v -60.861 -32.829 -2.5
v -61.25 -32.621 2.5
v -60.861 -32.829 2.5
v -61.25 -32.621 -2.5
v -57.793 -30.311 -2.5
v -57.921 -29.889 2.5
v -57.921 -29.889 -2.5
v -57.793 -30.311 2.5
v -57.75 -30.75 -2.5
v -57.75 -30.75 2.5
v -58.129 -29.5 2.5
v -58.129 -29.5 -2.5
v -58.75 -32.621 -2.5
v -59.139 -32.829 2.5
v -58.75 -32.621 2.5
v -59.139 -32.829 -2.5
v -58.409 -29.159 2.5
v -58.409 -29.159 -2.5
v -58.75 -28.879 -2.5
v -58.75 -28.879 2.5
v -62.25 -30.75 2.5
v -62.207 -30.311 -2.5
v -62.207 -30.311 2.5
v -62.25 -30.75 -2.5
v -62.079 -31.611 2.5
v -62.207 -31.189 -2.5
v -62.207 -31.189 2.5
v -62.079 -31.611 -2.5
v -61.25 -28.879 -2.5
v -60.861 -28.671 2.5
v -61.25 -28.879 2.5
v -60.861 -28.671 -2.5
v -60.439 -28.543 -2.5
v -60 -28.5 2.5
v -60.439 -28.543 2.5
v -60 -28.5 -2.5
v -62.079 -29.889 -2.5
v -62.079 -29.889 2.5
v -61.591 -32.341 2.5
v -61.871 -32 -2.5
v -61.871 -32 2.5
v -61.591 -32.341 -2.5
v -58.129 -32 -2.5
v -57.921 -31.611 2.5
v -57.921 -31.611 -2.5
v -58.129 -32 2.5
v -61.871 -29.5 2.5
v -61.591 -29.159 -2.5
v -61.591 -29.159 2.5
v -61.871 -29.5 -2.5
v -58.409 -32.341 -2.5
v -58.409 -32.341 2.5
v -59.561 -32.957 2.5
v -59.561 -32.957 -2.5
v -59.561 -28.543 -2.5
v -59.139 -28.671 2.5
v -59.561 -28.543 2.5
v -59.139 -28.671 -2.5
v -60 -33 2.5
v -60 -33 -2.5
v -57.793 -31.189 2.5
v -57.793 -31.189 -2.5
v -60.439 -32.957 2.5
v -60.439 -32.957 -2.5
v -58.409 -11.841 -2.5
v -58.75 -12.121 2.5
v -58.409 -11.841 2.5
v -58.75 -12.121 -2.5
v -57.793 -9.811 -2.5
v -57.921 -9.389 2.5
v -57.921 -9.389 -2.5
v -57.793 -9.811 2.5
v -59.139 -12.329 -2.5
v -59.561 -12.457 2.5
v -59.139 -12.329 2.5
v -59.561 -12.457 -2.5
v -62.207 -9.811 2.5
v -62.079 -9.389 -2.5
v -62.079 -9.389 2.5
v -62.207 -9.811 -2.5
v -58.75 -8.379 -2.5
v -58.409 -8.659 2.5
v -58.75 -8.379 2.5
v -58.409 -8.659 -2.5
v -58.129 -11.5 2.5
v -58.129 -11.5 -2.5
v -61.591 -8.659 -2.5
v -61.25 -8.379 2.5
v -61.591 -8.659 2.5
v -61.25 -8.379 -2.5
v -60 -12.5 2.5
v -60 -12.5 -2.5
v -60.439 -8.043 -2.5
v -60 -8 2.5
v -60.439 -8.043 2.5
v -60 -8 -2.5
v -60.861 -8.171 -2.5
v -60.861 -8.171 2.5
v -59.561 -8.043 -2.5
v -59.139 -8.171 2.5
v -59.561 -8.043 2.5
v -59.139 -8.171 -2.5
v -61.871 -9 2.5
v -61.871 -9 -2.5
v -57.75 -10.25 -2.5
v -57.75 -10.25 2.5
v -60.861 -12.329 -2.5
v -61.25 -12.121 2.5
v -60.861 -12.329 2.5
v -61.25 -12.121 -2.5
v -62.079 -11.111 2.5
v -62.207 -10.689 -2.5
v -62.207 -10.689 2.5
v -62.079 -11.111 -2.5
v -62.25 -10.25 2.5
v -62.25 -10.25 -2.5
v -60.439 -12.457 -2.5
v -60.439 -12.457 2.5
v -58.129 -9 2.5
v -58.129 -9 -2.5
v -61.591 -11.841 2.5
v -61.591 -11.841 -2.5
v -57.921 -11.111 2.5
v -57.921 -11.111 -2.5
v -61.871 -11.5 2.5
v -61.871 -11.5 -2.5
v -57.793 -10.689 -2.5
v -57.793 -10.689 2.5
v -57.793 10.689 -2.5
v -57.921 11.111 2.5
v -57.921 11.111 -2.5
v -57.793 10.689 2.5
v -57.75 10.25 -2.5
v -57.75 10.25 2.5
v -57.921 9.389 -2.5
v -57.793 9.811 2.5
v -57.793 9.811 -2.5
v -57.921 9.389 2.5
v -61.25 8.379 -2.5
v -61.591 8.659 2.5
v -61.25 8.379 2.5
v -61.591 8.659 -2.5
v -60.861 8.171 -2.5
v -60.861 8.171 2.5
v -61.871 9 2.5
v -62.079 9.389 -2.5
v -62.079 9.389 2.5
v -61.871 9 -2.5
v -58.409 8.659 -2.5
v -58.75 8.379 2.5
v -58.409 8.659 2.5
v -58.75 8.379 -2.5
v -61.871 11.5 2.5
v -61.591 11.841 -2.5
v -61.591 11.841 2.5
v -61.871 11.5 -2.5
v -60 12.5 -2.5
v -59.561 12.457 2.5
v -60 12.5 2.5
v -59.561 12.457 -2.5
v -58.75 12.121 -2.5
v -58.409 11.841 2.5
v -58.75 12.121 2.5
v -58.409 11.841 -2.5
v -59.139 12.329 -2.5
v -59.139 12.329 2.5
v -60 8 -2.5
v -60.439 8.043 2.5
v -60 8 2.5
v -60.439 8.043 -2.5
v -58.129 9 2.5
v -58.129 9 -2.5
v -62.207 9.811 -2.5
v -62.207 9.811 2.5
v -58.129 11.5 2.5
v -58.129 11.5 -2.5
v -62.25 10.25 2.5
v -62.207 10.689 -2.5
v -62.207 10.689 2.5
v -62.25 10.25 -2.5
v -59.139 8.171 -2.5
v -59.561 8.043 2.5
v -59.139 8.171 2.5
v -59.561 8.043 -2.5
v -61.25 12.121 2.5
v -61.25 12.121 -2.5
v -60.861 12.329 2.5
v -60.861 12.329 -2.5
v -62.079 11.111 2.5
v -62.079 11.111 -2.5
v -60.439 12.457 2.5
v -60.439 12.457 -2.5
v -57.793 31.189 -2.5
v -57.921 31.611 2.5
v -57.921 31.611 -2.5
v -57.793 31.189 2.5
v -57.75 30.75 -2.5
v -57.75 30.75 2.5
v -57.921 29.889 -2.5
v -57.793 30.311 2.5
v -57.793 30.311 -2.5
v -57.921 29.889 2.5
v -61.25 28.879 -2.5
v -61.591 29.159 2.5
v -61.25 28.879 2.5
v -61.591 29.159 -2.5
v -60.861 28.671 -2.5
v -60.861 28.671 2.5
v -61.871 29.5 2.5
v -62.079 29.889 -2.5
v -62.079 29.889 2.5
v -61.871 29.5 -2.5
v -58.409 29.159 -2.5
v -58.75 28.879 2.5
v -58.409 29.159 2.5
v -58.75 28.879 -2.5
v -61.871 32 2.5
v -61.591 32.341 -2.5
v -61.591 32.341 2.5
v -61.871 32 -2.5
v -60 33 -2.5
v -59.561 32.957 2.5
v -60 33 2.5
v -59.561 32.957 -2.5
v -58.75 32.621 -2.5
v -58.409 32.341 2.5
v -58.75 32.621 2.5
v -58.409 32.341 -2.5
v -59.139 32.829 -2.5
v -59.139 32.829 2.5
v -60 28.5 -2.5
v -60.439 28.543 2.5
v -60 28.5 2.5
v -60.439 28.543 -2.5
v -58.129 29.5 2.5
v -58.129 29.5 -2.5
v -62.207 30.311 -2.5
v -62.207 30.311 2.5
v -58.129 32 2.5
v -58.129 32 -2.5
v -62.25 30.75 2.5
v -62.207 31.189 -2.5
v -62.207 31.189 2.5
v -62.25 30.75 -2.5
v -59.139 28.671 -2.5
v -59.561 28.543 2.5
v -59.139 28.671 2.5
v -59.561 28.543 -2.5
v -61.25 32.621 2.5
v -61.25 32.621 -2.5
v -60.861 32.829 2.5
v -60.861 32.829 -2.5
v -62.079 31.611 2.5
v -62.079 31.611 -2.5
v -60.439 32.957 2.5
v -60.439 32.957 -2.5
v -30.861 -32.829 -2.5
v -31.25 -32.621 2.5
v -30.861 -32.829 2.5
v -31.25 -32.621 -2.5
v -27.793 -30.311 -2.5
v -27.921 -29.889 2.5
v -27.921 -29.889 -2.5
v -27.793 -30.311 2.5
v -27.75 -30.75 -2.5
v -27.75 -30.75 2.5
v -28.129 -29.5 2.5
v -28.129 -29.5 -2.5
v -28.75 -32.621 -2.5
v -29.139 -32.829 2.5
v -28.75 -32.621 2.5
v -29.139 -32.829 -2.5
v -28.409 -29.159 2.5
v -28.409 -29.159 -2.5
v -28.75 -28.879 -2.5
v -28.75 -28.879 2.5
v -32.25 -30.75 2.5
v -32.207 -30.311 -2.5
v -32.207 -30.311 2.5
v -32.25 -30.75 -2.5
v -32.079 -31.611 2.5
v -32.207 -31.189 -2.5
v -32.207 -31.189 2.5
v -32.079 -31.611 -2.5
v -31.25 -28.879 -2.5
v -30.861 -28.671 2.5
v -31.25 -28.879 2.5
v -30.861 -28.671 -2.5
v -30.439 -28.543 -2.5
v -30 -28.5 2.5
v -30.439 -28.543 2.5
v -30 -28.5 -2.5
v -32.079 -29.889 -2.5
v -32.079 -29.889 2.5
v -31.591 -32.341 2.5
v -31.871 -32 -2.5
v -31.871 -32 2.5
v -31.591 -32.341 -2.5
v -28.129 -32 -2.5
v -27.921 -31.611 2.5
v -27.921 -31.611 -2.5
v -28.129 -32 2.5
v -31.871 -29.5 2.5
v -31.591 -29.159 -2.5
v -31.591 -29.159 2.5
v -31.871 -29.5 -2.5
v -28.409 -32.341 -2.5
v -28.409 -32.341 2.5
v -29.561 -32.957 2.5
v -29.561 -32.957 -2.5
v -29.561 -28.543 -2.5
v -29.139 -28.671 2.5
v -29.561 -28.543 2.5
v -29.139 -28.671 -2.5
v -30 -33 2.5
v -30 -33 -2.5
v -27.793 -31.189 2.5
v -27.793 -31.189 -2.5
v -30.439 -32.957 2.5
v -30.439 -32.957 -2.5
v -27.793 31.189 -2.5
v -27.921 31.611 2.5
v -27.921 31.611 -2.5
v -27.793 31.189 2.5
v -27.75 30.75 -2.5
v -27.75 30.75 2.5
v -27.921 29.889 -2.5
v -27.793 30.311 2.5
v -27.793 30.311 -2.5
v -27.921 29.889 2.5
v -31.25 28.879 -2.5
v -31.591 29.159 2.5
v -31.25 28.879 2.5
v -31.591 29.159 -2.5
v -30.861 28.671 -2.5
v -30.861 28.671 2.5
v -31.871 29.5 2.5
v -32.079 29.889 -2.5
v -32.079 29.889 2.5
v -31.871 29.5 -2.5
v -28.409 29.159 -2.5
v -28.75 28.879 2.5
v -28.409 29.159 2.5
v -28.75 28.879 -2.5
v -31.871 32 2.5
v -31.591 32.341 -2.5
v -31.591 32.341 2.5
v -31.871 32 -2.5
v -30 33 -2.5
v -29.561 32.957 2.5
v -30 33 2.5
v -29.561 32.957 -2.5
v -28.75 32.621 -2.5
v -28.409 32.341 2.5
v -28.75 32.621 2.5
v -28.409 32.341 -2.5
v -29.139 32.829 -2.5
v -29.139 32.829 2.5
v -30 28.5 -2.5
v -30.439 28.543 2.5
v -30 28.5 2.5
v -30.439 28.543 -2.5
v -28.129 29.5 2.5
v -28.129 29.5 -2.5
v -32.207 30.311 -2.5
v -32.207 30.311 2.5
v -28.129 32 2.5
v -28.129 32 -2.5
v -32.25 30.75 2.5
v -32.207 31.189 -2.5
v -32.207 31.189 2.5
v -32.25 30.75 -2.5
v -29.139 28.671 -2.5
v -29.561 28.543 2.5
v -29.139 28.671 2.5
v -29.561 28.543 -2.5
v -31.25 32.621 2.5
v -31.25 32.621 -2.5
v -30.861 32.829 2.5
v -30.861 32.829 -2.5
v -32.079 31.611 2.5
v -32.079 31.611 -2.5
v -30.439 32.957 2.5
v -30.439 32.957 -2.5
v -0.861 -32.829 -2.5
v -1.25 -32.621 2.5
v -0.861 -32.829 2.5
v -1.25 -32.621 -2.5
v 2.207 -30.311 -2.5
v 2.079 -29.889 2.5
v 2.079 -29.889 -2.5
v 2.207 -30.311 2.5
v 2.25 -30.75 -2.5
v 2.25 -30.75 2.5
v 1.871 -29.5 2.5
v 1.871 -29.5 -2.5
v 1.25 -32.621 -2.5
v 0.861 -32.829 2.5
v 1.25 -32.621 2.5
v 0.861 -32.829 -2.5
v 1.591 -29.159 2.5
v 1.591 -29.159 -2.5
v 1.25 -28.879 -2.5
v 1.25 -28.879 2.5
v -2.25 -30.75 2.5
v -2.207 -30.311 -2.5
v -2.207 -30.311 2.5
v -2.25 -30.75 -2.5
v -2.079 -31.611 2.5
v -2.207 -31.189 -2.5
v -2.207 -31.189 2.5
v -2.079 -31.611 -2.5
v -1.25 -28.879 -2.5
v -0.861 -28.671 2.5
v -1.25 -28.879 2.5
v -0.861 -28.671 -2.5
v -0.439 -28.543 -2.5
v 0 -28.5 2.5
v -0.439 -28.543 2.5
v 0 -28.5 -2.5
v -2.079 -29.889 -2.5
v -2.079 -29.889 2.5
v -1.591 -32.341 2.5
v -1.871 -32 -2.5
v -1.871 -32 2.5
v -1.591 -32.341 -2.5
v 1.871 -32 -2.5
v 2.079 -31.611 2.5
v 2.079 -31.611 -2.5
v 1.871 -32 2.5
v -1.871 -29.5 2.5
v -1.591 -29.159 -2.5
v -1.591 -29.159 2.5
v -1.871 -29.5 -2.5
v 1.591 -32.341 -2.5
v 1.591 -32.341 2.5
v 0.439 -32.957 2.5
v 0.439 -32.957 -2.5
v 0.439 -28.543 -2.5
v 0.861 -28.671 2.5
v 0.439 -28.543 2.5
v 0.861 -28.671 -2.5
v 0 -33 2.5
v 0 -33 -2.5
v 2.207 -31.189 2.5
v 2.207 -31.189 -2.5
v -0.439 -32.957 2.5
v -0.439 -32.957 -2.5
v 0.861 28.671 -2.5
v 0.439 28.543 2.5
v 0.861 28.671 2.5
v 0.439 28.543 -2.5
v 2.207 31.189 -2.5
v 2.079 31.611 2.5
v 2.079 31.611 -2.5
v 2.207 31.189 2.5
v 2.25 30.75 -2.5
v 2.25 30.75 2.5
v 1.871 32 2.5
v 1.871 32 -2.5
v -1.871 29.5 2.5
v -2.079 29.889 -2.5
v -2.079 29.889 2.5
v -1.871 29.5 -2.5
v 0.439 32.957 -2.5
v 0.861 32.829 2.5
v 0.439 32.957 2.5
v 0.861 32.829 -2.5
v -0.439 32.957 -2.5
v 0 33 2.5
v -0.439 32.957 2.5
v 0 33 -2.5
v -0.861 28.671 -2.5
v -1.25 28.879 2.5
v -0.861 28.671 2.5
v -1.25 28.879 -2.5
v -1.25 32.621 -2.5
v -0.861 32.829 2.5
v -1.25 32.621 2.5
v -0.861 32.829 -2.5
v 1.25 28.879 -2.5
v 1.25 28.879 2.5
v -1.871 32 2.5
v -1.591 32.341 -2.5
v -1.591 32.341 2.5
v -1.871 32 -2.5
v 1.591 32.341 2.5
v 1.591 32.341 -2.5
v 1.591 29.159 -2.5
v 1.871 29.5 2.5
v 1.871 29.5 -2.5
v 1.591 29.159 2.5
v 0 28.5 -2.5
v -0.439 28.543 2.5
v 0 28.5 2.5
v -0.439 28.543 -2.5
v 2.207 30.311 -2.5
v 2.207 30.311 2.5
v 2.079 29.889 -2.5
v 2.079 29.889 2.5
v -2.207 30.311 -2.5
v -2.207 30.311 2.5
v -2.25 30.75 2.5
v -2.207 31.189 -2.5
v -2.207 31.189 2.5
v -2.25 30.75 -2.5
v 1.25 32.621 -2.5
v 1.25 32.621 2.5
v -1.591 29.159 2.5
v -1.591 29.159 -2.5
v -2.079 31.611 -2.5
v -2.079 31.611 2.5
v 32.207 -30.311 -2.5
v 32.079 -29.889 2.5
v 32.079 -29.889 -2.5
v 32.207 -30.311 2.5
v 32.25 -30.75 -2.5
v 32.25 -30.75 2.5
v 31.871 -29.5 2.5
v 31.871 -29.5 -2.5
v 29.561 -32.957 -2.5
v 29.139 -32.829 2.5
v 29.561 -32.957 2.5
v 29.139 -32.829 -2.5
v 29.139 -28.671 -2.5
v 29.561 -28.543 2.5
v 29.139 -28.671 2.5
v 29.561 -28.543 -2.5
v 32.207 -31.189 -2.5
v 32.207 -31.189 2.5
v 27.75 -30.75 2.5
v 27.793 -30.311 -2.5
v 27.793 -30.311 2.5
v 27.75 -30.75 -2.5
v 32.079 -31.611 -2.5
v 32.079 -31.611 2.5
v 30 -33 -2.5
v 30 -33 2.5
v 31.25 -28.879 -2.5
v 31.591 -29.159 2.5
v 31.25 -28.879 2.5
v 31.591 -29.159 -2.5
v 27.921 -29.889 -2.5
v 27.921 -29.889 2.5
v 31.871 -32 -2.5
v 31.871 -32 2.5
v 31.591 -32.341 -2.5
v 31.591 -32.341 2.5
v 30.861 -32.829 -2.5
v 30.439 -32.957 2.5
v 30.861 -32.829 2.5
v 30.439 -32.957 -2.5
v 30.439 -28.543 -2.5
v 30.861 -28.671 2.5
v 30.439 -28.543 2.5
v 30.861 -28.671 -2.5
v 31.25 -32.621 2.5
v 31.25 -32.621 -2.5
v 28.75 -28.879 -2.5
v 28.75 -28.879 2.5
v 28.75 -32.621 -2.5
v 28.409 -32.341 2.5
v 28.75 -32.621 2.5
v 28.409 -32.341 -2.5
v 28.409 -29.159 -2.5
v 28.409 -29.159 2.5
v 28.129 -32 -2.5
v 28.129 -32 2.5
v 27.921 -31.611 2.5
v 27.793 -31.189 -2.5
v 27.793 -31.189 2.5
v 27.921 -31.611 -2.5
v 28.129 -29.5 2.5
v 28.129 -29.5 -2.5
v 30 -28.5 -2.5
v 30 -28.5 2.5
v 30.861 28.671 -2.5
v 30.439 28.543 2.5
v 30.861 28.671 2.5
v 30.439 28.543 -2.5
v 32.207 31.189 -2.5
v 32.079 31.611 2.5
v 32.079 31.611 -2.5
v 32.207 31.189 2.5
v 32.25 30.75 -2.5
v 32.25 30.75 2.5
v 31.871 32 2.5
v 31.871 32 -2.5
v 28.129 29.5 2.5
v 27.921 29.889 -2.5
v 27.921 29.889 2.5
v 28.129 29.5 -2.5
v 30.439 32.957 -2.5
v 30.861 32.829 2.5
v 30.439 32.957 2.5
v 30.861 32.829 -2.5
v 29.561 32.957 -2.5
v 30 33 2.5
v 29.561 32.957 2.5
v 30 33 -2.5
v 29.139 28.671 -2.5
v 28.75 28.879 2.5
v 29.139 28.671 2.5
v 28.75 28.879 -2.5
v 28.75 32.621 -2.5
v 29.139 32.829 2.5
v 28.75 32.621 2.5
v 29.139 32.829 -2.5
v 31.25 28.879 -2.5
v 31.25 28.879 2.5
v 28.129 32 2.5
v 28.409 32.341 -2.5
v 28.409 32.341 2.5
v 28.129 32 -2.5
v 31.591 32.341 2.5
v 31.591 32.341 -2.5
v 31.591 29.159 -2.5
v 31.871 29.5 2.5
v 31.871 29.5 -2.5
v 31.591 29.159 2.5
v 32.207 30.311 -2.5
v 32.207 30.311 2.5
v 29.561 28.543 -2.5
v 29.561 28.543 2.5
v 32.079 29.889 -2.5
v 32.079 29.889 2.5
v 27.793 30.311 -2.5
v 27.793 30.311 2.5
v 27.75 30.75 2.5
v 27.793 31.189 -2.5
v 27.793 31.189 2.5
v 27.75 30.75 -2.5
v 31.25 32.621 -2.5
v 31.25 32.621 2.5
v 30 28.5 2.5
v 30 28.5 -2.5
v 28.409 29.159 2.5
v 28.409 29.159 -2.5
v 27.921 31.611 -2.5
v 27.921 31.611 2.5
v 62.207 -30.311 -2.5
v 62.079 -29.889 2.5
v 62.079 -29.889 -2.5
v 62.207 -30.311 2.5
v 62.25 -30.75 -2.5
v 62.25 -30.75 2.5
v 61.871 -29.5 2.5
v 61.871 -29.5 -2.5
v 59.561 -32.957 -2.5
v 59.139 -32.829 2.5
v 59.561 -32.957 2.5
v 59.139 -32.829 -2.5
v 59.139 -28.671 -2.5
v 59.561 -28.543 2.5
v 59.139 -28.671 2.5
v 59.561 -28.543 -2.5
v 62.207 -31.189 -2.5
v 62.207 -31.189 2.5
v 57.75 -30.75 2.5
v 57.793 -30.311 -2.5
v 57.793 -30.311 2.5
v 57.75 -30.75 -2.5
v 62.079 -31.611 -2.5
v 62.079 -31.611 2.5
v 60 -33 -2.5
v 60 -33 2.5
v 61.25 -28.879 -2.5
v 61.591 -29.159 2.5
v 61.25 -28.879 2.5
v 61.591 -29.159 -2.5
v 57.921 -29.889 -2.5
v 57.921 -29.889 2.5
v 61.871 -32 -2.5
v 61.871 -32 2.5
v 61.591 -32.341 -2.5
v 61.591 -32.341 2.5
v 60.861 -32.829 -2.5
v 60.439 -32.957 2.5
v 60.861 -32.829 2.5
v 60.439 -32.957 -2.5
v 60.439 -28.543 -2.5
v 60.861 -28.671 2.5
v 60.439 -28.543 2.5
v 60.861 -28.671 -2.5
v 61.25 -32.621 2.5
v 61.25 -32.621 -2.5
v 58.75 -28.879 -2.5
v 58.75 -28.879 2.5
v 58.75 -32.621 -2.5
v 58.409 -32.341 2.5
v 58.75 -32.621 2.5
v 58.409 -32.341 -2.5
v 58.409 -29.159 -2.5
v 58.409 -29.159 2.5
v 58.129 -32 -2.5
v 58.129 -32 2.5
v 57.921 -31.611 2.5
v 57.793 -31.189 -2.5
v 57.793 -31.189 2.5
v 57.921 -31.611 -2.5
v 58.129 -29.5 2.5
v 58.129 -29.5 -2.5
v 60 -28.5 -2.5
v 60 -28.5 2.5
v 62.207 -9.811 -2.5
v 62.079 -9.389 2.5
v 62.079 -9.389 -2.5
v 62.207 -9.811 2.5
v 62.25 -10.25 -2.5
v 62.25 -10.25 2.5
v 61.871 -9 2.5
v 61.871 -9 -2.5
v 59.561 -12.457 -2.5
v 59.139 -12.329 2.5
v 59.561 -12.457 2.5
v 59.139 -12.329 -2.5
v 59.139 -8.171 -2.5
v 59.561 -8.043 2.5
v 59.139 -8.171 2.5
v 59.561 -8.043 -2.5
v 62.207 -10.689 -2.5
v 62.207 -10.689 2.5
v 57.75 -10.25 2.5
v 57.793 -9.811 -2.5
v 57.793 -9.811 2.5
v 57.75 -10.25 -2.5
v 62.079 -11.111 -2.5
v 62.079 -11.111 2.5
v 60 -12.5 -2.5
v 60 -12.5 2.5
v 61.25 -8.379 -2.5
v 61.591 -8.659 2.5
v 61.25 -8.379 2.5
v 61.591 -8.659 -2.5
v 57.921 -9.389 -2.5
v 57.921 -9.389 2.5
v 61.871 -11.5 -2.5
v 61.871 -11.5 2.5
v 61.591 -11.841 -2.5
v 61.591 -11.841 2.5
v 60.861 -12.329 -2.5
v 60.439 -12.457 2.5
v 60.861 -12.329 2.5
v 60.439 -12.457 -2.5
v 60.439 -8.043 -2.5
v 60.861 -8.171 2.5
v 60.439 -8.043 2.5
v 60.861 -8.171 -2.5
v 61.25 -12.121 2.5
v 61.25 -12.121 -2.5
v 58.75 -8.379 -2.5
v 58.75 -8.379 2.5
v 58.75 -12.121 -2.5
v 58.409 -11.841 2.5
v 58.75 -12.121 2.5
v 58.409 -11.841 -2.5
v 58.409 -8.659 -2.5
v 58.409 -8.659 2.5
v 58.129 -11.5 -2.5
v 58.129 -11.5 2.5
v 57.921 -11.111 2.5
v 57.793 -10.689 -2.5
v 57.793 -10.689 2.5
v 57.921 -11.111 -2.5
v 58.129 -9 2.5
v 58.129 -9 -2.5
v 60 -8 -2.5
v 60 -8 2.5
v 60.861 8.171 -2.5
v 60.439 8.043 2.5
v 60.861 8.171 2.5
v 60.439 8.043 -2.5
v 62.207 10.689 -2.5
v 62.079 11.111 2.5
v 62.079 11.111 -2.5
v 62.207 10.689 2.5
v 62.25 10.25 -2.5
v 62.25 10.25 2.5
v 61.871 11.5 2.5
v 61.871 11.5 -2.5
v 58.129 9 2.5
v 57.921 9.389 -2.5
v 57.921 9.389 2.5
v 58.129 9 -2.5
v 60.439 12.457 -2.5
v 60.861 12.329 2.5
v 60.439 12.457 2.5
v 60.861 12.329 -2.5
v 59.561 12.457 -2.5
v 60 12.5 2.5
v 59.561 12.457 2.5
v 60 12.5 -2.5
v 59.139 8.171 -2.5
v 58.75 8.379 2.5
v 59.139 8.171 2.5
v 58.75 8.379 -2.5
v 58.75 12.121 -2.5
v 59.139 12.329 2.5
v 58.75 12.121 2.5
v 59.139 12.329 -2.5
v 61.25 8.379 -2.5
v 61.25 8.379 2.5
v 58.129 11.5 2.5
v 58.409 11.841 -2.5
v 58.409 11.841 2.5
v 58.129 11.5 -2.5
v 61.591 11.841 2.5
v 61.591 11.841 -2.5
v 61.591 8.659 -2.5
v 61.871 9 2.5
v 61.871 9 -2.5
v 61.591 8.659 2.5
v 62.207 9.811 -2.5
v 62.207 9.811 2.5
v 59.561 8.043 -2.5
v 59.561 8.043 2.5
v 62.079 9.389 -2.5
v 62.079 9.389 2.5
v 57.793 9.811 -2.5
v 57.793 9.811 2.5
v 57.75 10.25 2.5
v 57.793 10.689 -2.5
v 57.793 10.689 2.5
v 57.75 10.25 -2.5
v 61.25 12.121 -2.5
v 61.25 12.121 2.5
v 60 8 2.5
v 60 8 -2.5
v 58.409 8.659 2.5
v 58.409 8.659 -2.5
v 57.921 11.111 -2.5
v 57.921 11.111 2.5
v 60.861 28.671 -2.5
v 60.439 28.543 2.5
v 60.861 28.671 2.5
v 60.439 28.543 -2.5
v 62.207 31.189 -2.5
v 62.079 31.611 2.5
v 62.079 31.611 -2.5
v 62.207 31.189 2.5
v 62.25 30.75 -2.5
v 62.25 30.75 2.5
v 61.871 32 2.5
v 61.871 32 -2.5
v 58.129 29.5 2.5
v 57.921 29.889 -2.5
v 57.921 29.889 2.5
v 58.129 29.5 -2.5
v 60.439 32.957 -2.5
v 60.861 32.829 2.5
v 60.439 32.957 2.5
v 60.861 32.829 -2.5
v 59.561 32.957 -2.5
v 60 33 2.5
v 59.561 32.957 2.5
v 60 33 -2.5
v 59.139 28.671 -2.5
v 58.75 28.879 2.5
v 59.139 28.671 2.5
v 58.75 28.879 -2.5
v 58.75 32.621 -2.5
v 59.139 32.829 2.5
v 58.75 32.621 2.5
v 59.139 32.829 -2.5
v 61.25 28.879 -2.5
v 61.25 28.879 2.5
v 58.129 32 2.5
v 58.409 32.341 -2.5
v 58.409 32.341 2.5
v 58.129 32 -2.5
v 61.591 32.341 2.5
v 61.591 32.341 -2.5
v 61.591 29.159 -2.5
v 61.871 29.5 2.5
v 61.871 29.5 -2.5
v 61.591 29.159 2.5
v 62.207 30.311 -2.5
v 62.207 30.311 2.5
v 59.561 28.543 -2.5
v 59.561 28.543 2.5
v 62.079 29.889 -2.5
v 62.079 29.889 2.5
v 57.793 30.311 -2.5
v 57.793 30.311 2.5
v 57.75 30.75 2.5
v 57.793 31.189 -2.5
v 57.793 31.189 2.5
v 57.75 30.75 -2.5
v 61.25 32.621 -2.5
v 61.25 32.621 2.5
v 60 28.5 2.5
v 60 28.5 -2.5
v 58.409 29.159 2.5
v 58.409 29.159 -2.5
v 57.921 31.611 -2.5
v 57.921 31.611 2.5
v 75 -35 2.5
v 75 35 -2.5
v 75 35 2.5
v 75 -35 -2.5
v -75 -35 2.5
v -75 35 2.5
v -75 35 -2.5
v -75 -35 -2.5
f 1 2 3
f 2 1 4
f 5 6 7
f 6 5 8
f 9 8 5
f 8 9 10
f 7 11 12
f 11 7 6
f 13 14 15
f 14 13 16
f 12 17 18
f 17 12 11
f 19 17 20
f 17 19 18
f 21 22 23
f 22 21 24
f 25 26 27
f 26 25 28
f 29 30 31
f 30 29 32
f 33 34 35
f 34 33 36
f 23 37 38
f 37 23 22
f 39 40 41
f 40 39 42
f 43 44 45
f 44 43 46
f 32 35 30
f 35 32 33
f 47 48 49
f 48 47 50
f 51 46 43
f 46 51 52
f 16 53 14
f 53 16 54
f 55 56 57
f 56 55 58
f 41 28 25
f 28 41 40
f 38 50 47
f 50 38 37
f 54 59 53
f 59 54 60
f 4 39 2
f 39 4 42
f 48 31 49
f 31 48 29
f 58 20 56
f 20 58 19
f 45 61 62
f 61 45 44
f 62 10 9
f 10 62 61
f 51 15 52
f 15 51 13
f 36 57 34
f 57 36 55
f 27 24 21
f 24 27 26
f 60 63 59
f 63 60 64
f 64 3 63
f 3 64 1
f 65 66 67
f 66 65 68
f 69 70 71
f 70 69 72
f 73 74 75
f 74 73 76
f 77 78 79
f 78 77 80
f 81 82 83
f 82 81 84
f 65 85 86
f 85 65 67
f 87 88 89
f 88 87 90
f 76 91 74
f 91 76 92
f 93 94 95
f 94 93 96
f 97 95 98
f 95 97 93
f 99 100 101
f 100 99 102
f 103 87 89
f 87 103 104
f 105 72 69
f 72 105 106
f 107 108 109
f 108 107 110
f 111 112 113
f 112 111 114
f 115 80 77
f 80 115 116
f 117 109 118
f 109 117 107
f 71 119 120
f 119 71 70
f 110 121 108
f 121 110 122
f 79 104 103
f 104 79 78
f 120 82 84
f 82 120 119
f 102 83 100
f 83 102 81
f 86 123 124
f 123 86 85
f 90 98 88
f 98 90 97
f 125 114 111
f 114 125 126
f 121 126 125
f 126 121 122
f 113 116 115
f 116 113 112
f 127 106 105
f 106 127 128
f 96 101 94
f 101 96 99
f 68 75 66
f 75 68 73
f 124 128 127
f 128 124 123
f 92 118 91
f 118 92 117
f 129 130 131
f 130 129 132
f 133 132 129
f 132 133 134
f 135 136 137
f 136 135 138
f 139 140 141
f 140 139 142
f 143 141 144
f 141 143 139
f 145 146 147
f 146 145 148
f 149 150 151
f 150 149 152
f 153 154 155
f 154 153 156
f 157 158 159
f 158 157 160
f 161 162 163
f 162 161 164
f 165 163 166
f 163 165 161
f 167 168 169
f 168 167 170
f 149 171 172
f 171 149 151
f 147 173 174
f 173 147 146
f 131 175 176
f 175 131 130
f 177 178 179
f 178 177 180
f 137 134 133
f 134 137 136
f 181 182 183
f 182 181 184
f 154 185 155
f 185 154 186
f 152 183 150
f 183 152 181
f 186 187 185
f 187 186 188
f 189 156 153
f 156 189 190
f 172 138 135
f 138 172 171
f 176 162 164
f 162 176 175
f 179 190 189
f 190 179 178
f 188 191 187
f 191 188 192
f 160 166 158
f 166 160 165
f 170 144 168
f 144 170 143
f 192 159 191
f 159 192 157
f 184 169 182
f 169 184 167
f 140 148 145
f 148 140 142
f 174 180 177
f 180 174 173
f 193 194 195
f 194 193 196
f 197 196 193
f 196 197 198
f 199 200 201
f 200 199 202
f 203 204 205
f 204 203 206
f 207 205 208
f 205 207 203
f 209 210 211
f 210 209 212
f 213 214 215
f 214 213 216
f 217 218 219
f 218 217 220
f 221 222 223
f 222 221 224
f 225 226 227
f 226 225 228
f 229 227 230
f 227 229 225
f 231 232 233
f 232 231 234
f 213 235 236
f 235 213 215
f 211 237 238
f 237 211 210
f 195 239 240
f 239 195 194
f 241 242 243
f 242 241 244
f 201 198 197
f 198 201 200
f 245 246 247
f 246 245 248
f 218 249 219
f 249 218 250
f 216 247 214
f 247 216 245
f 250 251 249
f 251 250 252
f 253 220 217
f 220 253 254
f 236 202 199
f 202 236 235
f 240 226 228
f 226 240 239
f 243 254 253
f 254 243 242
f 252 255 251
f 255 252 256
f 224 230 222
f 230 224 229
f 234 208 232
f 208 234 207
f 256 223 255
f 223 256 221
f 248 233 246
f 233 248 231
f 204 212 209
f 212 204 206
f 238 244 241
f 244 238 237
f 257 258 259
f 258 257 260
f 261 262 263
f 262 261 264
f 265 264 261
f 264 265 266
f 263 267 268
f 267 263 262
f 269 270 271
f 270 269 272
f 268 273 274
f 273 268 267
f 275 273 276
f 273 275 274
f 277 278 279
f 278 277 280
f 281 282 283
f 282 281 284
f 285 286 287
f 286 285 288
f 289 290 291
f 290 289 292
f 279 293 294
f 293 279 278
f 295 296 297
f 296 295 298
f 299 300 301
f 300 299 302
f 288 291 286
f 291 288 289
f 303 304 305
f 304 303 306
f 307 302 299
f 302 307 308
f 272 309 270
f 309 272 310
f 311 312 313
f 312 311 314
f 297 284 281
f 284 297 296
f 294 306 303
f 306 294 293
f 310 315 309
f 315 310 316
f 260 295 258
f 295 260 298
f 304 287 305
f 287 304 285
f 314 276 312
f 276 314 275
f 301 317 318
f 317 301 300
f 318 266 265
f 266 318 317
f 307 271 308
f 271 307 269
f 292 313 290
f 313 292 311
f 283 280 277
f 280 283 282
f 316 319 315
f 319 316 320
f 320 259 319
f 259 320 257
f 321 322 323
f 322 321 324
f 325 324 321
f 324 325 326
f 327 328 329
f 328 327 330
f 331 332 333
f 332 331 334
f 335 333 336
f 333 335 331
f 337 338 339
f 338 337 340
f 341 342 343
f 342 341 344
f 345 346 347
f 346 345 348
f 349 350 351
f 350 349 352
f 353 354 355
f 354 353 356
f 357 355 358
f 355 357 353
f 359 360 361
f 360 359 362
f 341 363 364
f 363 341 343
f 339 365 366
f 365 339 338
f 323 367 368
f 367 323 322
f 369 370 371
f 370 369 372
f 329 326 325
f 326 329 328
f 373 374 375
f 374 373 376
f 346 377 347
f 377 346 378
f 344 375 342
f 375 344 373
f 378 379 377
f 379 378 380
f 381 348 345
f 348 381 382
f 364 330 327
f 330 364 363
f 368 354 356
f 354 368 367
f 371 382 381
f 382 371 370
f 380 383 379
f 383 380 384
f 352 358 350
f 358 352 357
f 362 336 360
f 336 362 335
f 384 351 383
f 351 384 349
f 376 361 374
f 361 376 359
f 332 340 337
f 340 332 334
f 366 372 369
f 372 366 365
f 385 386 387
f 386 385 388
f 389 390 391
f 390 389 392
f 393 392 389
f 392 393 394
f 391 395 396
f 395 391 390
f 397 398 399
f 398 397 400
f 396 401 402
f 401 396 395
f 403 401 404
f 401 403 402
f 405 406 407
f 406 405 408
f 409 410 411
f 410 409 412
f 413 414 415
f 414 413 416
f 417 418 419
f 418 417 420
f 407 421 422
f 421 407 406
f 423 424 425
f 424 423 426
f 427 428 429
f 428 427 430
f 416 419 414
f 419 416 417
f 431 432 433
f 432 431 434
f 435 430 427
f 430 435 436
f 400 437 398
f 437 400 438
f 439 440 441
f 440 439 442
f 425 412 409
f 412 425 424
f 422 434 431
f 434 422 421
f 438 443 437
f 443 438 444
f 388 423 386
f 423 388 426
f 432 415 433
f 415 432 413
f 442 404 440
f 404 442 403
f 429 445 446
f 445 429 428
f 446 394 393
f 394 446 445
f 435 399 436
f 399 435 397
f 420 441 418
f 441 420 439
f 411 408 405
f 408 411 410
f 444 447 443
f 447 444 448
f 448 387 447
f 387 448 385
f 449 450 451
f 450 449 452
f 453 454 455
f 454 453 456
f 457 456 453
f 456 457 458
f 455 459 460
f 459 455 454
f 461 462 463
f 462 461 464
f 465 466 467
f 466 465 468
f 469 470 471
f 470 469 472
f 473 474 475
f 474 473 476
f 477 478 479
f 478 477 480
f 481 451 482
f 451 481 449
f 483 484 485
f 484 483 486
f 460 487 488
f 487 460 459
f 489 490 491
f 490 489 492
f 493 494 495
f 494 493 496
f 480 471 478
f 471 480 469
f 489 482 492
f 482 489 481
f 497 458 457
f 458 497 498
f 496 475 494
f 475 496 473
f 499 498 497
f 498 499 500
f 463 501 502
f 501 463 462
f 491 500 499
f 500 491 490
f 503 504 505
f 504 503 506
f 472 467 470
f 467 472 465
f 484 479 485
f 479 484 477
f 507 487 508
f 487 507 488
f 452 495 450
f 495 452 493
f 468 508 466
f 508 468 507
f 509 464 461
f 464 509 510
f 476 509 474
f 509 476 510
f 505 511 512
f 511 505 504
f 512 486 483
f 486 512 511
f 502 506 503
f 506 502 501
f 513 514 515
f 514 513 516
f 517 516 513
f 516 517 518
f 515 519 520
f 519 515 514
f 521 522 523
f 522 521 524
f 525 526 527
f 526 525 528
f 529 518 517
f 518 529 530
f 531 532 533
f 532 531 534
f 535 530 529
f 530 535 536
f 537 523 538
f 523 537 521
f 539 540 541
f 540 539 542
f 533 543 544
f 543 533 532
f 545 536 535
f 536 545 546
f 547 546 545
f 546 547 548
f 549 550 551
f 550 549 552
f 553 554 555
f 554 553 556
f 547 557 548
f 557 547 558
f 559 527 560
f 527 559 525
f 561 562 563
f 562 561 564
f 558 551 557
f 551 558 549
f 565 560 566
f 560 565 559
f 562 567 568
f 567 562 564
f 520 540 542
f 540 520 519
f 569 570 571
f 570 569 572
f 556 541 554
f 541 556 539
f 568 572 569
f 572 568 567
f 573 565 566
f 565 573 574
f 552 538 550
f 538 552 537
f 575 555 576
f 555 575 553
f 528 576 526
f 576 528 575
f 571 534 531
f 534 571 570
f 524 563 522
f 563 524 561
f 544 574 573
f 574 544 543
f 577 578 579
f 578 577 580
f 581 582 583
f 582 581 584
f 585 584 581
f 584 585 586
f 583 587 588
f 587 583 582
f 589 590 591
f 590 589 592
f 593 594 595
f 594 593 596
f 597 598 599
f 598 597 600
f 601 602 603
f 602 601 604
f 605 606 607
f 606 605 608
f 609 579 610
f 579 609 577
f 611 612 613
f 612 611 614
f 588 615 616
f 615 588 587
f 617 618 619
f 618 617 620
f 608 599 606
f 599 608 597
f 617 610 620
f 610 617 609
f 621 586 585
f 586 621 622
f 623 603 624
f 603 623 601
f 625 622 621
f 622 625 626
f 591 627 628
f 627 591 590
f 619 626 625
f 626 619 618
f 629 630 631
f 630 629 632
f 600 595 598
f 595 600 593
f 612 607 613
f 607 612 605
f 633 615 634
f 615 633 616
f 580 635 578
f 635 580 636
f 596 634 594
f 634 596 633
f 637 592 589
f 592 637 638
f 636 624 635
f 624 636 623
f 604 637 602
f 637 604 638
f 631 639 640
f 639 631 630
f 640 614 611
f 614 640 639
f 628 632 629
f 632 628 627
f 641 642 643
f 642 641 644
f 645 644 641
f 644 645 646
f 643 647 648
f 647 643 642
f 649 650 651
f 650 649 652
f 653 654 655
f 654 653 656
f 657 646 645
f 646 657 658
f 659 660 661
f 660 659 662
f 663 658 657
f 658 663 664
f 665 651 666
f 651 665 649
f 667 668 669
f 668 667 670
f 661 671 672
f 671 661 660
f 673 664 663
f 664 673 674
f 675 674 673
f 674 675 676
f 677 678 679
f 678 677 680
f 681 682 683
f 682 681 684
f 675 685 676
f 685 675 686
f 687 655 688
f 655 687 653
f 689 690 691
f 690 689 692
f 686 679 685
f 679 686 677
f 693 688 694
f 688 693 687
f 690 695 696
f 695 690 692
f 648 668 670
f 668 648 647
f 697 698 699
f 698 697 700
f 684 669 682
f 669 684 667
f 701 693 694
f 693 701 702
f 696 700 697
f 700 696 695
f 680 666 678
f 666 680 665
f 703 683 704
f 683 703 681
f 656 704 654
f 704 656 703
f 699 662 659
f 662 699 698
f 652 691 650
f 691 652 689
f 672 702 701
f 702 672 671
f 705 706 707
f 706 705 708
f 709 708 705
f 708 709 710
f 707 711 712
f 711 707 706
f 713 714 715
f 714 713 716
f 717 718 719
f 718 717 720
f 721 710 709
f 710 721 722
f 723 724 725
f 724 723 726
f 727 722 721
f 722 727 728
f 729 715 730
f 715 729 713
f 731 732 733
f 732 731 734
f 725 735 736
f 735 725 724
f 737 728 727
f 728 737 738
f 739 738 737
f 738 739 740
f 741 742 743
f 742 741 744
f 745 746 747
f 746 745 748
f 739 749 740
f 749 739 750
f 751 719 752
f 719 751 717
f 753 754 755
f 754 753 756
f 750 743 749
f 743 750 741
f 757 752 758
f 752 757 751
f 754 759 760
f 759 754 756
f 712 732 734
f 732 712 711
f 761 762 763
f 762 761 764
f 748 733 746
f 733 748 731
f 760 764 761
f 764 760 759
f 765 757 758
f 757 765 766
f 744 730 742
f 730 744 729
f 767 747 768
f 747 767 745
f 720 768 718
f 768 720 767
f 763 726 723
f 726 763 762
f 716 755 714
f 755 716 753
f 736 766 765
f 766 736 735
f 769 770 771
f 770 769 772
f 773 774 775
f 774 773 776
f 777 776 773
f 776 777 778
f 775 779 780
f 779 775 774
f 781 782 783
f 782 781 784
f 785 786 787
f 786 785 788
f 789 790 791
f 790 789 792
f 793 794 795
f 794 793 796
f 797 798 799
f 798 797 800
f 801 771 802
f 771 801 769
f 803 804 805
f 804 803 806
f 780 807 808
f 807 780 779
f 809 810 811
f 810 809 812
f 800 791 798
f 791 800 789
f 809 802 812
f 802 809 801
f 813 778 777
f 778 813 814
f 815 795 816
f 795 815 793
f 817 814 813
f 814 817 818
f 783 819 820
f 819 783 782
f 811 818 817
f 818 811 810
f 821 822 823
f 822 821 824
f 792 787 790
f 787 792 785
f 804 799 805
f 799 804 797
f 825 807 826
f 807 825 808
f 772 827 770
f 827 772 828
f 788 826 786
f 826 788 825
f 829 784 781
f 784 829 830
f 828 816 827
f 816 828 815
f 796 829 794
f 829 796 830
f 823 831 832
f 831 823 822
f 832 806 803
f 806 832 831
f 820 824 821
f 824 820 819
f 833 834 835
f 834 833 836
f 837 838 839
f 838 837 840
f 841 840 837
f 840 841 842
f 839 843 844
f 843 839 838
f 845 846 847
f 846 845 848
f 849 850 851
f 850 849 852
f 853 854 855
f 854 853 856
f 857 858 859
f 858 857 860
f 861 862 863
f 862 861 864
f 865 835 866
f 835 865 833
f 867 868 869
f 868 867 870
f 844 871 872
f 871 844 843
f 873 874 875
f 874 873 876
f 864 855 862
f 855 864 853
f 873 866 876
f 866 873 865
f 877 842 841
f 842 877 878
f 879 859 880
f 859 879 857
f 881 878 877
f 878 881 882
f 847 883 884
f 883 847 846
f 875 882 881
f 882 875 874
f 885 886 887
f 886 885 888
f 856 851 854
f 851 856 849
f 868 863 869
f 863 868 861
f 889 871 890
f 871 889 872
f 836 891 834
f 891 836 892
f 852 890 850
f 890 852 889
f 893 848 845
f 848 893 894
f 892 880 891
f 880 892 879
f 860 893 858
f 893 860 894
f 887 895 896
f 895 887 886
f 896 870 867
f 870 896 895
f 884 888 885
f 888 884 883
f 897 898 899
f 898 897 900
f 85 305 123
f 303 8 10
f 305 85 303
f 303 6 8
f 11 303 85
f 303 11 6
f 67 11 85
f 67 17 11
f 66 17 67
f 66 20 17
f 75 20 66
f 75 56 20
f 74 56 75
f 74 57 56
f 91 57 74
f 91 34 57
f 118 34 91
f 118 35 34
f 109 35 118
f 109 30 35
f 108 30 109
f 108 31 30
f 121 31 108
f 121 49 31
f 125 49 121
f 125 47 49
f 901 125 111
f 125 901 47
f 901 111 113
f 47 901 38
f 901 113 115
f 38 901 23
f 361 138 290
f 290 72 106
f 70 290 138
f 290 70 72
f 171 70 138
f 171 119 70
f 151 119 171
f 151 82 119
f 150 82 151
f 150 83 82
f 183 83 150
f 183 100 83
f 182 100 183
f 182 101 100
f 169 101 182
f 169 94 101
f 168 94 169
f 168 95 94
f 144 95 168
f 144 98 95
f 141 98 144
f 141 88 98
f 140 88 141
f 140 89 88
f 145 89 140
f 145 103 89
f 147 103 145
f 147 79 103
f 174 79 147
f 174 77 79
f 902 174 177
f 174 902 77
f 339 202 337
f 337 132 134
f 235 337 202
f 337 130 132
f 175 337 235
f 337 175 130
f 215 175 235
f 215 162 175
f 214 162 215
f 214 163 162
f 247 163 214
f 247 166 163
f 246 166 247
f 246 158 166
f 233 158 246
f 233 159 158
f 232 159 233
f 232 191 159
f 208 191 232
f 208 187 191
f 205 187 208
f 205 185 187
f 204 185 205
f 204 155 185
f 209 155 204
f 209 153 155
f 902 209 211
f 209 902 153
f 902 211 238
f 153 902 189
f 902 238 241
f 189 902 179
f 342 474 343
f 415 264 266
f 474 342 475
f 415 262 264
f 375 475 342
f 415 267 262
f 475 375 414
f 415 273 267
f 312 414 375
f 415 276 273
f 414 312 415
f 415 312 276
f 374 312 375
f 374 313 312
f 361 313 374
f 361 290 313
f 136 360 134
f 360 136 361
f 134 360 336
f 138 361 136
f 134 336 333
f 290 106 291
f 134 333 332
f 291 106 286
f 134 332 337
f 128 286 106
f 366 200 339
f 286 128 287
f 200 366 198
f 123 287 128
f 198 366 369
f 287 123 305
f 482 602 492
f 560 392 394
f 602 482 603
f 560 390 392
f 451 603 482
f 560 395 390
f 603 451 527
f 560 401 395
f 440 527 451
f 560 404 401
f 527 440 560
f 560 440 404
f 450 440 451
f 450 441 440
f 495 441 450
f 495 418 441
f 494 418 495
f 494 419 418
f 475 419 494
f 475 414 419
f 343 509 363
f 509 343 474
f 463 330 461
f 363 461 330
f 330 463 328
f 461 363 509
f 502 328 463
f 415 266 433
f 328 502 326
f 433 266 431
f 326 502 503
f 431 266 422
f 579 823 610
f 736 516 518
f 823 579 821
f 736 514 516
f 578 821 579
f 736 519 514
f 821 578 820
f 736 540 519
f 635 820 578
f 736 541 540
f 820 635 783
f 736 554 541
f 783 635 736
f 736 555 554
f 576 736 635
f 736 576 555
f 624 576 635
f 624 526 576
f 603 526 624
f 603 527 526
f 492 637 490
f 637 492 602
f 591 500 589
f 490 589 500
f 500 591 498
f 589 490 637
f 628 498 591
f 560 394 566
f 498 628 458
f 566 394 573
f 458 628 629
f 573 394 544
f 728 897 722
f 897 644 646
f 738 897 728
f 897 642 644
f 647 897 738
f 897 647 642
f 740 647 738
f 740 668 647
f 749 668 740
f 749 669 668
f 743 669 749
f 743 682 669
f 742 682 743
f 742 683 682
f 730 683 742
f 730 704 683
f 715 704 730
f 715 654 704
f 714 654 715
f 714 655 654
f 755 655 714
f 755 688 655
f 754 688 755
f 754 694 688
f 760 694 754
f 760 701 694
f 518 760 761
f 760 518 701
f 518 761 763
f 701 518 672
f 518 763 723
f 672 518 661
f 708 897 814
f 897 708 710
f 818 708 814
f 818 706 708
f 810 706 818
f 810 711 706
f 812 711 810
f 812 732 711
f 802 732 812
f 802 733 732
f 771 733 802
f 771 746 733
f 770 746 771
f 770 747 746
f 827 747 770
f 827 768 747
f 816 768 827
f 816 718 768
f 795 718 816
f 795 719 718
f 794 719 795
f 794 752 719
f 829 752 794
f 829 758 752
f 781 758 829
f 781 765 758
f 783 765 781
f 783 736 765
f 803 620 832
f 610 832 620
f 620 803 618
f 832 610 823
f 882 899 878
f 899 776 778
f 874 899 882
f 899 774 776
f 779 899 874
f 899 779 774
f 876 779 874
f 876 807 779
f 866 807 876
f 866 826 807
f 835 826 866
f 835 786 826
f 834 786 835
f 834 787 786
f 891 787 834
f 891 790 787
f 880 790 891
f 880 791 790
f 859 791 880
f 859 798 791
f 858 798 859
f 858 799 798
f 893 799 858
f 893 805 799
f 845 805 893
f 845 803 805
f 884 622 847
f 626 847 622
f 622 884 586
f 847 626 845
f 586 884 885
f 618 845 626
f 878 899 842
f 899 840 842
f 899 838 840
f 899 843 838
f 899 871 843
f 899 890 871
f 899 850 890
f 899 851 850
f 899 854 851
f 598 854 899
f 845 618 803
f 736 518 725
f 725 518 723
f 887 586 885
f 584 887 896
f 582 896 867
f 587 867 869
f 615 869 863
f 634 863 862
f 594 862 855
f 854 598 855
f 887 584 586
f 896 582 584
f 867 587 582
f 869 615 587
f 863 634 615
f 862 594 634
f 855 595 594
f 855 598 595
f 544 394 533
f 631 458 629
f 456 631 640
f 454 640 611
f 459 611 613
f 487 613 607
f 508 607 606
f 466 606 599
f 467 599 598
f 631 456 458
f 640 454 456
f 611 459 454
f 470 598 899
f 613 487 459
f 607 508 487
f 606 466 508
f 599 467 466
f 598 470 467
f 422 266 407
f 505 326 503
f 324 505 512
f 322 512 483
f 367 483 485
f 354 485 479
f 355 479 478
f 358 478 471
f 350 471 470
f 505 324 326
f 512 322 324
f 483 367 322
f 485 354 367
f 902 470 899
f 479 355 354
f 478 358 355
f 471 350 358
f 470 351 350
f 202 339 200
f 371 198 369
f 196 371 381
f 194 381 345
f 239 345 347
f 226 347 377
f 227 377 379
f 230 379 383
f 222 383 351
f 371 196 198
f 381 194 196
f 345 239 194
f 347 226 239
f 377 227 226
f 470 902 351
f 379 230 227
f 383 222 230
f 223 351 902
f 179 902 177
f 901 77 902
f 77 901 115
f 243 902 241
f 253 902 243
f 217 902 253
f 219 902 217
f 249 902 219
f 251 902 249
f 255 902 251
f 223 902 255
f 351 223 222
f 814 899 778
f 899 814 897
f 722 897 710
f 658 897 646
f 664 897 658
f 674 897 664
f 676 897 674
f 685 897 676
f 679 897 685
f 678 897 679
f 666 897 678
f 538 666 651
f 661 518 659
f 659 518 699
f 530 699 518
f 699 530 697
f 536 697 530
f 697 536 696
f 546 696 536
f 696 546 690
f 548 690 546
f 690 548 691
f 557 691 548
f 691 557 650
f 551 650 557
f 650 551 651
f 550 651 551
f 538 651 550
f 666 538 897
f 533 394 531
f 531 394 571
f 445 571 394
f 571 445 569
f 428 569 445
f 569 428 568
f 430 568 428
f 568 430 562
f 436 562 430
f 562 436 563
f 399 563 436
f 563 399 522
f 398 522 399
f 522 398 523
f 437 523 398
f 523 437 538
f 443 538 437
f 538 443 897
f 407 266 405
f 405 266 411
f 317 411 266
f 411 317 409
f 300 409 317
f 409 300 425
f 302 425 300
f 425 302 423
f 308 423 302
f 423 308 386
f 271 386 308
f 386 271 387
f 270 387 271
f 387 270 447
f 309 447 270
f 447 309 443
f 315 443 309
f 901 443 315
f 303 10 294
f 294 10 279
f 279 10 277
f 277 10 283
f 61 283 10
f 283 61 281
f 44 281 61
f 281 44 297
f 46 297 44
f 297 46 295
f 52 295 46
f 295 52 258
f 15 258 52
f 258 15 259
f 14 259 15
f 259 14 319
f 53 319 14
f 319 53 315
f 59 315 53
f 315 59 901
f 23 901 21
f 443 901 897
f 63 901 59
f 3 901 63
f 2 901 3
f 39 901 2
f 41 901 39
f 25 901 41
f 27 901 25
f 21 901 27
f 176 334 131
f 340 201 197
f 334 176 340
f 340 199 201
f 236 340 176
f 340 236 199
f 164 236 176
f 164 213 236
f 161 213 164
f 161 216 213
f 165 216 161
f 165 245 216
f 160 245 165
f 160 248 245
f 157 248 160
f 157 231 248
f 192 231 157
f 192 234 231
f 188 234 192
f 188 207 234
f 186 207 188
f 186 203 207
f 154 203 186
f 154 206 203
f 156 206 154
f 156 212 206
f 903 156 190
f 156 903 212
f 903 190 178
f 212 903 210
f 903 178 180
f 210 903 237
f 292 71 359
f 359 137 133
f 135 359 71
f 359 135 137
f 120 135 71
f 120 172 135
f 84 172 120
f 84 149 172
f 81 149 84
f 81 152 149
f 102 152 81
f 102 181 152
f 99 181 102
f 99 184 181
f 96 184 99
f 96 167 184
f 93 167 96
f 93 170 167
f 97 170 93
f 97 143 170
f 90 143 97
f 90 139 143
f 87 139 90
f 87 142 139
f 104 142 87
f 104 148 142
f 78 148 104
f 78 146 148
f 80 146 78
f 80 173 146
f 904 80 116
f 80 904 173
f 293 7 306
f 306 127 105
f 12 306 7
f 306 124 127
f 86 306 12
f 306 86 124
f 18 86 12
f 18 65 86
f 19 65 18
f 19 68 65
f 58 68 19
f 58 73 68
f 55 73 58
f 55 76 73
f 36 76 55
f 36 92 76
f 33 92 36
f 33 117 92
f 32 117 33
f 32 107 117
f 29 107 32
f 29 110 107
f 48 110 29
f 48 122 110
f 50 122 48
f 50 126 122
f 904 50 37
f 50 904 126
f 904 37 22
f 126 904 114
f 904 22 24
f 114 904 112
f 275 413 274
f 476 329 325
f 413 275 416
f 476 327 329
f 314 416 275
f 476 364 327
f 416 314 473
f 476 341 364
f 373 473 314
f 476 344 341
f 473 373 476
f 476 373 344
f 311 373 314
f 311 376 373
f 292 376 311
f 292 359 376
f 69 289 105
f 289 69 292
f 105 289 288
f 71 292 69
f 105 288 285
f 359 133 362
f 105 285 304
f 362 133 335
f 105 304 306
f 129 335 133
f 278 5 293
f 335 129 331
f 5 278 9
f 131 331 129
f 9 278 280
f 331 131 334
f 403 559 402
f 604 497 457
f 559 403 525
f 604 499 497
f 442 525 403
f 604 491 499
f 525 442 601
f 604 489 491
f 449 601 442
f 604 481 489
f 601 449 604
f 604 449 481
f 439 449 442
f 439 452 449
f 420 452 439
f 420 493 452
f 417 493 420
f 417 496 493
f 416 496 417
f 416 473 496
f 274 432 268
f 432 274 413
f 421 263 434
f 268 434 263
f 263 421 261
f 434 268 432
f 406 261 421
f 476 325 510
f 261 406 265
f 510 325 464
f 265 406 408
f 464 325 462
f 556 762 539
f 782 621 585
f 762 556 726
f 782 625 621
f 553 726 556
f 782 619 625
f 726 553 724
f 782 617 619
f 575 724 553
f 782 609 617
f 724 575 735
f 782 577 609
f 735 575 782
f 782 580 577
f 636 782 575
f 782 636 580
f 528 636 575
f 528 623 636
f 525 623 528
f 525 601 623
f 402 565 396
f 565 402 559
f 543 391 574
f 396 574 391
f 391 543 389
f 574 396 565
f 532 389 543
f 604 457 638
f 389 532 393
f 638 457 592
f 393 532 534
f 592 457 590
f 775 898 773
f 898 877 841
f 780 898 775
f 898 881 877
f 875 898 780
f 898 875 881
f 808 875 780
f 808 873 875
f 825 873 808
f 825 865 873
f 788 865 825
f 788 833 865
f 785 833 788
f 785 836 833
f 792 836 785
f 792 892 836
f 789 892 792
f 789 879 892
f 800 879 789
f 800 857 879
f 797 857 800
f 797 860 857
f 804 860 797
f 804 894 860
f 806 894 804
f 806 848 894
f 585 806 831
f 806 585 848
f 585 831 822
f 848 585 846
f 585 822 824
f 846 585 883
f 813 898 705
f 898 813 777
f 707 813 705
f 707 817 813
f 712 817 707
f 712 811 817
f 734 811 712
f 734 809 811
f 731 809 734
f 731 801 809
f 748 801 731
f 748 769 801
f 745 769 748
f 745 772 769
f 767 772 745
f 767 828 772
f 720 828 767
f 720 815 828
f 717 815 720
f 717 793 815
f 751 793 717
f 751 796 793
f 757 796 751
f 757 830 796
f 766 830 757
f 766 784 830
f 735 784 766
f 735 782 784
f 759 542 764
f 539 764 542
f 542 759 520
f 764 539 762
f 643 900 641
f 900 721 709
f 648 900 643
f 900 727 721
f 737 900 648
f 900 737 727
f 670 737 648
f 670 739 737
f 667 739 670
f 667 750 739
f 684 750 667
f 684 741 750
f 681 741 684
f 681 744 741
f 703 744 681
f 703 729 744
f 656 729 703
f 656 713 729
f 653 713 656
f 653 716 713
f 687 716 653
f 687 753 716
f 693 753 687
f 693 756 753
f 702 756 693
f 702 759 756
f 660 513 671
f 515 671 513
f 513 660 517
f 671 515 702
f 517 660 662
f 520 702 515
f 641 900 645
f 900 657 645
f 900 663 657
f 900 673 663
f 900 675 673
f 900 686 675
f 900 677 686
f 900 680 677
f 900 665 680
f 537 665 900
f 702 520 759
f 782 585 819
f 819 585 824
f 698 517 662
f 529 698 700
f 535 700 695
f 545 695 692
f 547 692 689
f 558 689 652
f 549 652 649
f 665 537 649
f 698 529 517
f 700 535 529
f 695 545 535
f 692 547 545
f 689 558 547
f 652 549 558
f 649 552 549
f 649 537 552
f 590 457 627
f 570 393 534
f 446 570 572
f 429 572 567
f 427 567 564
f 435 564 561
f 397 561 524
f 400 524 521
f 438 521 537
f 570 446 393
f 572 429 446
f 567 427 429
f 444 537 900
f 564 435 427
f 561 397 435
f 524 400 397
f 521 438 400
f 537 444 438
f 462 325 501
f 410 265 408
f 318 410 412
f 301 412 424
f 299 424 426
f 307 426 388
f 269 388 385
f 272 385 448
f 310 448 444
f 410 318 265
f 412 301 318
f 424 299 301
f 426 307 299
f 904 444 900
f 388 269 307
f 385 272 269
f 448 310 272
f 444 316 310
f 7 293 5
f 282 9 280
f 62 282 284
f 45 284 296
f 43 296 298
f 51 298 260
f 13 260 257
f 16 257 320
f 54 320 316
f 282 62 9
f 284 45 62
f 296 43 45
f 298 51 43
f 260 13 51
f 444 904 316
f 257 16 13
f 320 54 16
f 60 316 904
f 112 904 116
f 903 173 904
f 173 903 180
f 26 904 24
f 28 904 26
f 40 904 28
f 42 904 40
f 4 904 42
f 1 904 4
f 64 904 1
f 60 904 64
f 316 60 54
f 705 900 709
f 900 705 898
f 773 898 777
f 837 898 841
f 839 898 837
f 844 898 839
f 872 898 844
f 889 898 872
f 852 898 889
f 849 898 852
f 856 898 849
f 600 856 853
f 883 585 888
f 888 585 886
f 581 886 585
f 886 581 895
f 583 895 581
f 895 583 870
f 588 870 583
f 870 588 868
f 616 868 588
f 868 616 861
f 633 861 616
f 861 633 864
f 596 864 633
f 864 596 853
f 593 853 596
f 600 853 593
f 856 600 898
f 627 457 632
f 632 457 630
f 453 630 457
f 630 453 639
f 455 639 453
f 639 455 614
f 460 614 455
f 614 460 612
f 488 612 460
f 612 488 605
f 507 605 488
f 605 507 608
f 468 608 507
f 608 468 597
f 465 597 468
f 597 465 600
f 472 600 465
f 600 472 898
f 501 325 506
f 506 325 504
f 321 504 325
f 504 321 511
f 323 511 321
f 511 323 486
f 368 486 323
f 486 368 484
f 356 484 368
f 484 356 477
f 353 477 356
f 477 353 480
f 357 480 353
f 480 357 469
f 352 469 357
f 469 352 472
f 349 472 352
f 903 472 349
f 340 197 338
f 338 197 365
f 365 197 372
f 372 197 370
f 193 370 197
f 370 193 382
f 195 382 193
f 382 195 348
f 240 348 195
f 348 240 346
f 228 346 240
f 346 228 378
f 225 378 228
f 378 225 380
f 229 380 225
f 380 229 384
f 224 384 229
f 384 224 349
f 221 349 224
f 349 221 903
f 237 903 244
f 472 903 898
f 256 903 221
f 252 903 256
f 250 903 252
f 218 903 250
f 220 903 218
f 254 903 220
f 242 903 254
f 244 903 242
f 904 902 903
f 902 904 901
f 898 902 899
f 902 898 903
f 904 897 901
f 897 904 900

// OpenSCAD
$fn = 32;

// ----------------------------------------------------------------------
// Perforated panel 150 x 70 x 5
// 4 x 5 Ø4.5 holes, frame layout
// ----------------------------------------------------------------------

// --- parameters (mm) ---
panel = [150, 70, 5];  // overall size (x, y, z)
hole_d = 4.5;          // hole diameter
pitch_x = 30;          // hole pitch along X
pitch_y = 20.5;        // hole pitch along Y

// --- derived feature positions (mm) ---
margin = hole_d / 2 + 2;            // = 4.25   clearance from the panel edge
cols = floor((panel[0] - 2 * margin) / pitch_x) + 1;  // = 5   how many columns fit in X
rows = floor((panel[1] - 2 * margin) / pitch_y) + 1;  // = 4   how many rows fit in Y
span_x = (cols - 1) * pitch_x + 0;  // = 120   width of the field
span_y = (rows - 1) * pitch_y;      // = 61.5   height of the field
origin_x = -span_x / 2;             // = -60   X of the first hole
origin_y = -span_y / 2;             // = -30.75   Y of the first row
holes = 2 * cols + 2 * (rows - 2);  // = 14   holes around the frame
feature_centers = [
  [origin_x + 0 * pitch_x, origin_y + 0 * pitch_y],
  [origin_x + 0 * pitch_x, origin_y + 1 * pitch_y],
  [origin_x + 0 * pitch_x, origin_y + 2 * pitch_y],
  [origin_x + 0 * pitch_x, origin_y + 3 * pitch_y],
  [origin_x + 1 * pitch_x, origin_y + 0 * pitch_y],
  [origin_x + 1 * pitch_x, origin_y + 3 * pitch_y],
  [origin_x + 2 * pitch_x, origin_y + 0 * pitch_y],
  [origin_x + 2 * pitch_x, origin_y + 3 * pitch_y],
  [origin_x + 3 * pitch_x, origin_y + 0 * pitch_y],
  [origin_x + 3 * pitch_x, origin_y + 3 * pitch_y],
  [origin_x + 4 * pitch_x, origin_y + 0 * pitch_y],
  [origin_x + 4 * pitch_x, origin_y + 1 * pitch_y],
  [origin_x + 4 * pitch_x, origin_y + 2 * pitch_y],
  [origin_x + 4 * pitch_x, origin_y + 3 * pitch_y]
];   // hole centres, used verbatim by the cutter loop

// panel outline, every hole through
difference() {
  cube(panel, center = true);
  for (centre = feature_centers)
    translate([centre[0], centre[1], 0])
      cylinder(d = hole_d, h = panel[2] + 2, center = true);
}
